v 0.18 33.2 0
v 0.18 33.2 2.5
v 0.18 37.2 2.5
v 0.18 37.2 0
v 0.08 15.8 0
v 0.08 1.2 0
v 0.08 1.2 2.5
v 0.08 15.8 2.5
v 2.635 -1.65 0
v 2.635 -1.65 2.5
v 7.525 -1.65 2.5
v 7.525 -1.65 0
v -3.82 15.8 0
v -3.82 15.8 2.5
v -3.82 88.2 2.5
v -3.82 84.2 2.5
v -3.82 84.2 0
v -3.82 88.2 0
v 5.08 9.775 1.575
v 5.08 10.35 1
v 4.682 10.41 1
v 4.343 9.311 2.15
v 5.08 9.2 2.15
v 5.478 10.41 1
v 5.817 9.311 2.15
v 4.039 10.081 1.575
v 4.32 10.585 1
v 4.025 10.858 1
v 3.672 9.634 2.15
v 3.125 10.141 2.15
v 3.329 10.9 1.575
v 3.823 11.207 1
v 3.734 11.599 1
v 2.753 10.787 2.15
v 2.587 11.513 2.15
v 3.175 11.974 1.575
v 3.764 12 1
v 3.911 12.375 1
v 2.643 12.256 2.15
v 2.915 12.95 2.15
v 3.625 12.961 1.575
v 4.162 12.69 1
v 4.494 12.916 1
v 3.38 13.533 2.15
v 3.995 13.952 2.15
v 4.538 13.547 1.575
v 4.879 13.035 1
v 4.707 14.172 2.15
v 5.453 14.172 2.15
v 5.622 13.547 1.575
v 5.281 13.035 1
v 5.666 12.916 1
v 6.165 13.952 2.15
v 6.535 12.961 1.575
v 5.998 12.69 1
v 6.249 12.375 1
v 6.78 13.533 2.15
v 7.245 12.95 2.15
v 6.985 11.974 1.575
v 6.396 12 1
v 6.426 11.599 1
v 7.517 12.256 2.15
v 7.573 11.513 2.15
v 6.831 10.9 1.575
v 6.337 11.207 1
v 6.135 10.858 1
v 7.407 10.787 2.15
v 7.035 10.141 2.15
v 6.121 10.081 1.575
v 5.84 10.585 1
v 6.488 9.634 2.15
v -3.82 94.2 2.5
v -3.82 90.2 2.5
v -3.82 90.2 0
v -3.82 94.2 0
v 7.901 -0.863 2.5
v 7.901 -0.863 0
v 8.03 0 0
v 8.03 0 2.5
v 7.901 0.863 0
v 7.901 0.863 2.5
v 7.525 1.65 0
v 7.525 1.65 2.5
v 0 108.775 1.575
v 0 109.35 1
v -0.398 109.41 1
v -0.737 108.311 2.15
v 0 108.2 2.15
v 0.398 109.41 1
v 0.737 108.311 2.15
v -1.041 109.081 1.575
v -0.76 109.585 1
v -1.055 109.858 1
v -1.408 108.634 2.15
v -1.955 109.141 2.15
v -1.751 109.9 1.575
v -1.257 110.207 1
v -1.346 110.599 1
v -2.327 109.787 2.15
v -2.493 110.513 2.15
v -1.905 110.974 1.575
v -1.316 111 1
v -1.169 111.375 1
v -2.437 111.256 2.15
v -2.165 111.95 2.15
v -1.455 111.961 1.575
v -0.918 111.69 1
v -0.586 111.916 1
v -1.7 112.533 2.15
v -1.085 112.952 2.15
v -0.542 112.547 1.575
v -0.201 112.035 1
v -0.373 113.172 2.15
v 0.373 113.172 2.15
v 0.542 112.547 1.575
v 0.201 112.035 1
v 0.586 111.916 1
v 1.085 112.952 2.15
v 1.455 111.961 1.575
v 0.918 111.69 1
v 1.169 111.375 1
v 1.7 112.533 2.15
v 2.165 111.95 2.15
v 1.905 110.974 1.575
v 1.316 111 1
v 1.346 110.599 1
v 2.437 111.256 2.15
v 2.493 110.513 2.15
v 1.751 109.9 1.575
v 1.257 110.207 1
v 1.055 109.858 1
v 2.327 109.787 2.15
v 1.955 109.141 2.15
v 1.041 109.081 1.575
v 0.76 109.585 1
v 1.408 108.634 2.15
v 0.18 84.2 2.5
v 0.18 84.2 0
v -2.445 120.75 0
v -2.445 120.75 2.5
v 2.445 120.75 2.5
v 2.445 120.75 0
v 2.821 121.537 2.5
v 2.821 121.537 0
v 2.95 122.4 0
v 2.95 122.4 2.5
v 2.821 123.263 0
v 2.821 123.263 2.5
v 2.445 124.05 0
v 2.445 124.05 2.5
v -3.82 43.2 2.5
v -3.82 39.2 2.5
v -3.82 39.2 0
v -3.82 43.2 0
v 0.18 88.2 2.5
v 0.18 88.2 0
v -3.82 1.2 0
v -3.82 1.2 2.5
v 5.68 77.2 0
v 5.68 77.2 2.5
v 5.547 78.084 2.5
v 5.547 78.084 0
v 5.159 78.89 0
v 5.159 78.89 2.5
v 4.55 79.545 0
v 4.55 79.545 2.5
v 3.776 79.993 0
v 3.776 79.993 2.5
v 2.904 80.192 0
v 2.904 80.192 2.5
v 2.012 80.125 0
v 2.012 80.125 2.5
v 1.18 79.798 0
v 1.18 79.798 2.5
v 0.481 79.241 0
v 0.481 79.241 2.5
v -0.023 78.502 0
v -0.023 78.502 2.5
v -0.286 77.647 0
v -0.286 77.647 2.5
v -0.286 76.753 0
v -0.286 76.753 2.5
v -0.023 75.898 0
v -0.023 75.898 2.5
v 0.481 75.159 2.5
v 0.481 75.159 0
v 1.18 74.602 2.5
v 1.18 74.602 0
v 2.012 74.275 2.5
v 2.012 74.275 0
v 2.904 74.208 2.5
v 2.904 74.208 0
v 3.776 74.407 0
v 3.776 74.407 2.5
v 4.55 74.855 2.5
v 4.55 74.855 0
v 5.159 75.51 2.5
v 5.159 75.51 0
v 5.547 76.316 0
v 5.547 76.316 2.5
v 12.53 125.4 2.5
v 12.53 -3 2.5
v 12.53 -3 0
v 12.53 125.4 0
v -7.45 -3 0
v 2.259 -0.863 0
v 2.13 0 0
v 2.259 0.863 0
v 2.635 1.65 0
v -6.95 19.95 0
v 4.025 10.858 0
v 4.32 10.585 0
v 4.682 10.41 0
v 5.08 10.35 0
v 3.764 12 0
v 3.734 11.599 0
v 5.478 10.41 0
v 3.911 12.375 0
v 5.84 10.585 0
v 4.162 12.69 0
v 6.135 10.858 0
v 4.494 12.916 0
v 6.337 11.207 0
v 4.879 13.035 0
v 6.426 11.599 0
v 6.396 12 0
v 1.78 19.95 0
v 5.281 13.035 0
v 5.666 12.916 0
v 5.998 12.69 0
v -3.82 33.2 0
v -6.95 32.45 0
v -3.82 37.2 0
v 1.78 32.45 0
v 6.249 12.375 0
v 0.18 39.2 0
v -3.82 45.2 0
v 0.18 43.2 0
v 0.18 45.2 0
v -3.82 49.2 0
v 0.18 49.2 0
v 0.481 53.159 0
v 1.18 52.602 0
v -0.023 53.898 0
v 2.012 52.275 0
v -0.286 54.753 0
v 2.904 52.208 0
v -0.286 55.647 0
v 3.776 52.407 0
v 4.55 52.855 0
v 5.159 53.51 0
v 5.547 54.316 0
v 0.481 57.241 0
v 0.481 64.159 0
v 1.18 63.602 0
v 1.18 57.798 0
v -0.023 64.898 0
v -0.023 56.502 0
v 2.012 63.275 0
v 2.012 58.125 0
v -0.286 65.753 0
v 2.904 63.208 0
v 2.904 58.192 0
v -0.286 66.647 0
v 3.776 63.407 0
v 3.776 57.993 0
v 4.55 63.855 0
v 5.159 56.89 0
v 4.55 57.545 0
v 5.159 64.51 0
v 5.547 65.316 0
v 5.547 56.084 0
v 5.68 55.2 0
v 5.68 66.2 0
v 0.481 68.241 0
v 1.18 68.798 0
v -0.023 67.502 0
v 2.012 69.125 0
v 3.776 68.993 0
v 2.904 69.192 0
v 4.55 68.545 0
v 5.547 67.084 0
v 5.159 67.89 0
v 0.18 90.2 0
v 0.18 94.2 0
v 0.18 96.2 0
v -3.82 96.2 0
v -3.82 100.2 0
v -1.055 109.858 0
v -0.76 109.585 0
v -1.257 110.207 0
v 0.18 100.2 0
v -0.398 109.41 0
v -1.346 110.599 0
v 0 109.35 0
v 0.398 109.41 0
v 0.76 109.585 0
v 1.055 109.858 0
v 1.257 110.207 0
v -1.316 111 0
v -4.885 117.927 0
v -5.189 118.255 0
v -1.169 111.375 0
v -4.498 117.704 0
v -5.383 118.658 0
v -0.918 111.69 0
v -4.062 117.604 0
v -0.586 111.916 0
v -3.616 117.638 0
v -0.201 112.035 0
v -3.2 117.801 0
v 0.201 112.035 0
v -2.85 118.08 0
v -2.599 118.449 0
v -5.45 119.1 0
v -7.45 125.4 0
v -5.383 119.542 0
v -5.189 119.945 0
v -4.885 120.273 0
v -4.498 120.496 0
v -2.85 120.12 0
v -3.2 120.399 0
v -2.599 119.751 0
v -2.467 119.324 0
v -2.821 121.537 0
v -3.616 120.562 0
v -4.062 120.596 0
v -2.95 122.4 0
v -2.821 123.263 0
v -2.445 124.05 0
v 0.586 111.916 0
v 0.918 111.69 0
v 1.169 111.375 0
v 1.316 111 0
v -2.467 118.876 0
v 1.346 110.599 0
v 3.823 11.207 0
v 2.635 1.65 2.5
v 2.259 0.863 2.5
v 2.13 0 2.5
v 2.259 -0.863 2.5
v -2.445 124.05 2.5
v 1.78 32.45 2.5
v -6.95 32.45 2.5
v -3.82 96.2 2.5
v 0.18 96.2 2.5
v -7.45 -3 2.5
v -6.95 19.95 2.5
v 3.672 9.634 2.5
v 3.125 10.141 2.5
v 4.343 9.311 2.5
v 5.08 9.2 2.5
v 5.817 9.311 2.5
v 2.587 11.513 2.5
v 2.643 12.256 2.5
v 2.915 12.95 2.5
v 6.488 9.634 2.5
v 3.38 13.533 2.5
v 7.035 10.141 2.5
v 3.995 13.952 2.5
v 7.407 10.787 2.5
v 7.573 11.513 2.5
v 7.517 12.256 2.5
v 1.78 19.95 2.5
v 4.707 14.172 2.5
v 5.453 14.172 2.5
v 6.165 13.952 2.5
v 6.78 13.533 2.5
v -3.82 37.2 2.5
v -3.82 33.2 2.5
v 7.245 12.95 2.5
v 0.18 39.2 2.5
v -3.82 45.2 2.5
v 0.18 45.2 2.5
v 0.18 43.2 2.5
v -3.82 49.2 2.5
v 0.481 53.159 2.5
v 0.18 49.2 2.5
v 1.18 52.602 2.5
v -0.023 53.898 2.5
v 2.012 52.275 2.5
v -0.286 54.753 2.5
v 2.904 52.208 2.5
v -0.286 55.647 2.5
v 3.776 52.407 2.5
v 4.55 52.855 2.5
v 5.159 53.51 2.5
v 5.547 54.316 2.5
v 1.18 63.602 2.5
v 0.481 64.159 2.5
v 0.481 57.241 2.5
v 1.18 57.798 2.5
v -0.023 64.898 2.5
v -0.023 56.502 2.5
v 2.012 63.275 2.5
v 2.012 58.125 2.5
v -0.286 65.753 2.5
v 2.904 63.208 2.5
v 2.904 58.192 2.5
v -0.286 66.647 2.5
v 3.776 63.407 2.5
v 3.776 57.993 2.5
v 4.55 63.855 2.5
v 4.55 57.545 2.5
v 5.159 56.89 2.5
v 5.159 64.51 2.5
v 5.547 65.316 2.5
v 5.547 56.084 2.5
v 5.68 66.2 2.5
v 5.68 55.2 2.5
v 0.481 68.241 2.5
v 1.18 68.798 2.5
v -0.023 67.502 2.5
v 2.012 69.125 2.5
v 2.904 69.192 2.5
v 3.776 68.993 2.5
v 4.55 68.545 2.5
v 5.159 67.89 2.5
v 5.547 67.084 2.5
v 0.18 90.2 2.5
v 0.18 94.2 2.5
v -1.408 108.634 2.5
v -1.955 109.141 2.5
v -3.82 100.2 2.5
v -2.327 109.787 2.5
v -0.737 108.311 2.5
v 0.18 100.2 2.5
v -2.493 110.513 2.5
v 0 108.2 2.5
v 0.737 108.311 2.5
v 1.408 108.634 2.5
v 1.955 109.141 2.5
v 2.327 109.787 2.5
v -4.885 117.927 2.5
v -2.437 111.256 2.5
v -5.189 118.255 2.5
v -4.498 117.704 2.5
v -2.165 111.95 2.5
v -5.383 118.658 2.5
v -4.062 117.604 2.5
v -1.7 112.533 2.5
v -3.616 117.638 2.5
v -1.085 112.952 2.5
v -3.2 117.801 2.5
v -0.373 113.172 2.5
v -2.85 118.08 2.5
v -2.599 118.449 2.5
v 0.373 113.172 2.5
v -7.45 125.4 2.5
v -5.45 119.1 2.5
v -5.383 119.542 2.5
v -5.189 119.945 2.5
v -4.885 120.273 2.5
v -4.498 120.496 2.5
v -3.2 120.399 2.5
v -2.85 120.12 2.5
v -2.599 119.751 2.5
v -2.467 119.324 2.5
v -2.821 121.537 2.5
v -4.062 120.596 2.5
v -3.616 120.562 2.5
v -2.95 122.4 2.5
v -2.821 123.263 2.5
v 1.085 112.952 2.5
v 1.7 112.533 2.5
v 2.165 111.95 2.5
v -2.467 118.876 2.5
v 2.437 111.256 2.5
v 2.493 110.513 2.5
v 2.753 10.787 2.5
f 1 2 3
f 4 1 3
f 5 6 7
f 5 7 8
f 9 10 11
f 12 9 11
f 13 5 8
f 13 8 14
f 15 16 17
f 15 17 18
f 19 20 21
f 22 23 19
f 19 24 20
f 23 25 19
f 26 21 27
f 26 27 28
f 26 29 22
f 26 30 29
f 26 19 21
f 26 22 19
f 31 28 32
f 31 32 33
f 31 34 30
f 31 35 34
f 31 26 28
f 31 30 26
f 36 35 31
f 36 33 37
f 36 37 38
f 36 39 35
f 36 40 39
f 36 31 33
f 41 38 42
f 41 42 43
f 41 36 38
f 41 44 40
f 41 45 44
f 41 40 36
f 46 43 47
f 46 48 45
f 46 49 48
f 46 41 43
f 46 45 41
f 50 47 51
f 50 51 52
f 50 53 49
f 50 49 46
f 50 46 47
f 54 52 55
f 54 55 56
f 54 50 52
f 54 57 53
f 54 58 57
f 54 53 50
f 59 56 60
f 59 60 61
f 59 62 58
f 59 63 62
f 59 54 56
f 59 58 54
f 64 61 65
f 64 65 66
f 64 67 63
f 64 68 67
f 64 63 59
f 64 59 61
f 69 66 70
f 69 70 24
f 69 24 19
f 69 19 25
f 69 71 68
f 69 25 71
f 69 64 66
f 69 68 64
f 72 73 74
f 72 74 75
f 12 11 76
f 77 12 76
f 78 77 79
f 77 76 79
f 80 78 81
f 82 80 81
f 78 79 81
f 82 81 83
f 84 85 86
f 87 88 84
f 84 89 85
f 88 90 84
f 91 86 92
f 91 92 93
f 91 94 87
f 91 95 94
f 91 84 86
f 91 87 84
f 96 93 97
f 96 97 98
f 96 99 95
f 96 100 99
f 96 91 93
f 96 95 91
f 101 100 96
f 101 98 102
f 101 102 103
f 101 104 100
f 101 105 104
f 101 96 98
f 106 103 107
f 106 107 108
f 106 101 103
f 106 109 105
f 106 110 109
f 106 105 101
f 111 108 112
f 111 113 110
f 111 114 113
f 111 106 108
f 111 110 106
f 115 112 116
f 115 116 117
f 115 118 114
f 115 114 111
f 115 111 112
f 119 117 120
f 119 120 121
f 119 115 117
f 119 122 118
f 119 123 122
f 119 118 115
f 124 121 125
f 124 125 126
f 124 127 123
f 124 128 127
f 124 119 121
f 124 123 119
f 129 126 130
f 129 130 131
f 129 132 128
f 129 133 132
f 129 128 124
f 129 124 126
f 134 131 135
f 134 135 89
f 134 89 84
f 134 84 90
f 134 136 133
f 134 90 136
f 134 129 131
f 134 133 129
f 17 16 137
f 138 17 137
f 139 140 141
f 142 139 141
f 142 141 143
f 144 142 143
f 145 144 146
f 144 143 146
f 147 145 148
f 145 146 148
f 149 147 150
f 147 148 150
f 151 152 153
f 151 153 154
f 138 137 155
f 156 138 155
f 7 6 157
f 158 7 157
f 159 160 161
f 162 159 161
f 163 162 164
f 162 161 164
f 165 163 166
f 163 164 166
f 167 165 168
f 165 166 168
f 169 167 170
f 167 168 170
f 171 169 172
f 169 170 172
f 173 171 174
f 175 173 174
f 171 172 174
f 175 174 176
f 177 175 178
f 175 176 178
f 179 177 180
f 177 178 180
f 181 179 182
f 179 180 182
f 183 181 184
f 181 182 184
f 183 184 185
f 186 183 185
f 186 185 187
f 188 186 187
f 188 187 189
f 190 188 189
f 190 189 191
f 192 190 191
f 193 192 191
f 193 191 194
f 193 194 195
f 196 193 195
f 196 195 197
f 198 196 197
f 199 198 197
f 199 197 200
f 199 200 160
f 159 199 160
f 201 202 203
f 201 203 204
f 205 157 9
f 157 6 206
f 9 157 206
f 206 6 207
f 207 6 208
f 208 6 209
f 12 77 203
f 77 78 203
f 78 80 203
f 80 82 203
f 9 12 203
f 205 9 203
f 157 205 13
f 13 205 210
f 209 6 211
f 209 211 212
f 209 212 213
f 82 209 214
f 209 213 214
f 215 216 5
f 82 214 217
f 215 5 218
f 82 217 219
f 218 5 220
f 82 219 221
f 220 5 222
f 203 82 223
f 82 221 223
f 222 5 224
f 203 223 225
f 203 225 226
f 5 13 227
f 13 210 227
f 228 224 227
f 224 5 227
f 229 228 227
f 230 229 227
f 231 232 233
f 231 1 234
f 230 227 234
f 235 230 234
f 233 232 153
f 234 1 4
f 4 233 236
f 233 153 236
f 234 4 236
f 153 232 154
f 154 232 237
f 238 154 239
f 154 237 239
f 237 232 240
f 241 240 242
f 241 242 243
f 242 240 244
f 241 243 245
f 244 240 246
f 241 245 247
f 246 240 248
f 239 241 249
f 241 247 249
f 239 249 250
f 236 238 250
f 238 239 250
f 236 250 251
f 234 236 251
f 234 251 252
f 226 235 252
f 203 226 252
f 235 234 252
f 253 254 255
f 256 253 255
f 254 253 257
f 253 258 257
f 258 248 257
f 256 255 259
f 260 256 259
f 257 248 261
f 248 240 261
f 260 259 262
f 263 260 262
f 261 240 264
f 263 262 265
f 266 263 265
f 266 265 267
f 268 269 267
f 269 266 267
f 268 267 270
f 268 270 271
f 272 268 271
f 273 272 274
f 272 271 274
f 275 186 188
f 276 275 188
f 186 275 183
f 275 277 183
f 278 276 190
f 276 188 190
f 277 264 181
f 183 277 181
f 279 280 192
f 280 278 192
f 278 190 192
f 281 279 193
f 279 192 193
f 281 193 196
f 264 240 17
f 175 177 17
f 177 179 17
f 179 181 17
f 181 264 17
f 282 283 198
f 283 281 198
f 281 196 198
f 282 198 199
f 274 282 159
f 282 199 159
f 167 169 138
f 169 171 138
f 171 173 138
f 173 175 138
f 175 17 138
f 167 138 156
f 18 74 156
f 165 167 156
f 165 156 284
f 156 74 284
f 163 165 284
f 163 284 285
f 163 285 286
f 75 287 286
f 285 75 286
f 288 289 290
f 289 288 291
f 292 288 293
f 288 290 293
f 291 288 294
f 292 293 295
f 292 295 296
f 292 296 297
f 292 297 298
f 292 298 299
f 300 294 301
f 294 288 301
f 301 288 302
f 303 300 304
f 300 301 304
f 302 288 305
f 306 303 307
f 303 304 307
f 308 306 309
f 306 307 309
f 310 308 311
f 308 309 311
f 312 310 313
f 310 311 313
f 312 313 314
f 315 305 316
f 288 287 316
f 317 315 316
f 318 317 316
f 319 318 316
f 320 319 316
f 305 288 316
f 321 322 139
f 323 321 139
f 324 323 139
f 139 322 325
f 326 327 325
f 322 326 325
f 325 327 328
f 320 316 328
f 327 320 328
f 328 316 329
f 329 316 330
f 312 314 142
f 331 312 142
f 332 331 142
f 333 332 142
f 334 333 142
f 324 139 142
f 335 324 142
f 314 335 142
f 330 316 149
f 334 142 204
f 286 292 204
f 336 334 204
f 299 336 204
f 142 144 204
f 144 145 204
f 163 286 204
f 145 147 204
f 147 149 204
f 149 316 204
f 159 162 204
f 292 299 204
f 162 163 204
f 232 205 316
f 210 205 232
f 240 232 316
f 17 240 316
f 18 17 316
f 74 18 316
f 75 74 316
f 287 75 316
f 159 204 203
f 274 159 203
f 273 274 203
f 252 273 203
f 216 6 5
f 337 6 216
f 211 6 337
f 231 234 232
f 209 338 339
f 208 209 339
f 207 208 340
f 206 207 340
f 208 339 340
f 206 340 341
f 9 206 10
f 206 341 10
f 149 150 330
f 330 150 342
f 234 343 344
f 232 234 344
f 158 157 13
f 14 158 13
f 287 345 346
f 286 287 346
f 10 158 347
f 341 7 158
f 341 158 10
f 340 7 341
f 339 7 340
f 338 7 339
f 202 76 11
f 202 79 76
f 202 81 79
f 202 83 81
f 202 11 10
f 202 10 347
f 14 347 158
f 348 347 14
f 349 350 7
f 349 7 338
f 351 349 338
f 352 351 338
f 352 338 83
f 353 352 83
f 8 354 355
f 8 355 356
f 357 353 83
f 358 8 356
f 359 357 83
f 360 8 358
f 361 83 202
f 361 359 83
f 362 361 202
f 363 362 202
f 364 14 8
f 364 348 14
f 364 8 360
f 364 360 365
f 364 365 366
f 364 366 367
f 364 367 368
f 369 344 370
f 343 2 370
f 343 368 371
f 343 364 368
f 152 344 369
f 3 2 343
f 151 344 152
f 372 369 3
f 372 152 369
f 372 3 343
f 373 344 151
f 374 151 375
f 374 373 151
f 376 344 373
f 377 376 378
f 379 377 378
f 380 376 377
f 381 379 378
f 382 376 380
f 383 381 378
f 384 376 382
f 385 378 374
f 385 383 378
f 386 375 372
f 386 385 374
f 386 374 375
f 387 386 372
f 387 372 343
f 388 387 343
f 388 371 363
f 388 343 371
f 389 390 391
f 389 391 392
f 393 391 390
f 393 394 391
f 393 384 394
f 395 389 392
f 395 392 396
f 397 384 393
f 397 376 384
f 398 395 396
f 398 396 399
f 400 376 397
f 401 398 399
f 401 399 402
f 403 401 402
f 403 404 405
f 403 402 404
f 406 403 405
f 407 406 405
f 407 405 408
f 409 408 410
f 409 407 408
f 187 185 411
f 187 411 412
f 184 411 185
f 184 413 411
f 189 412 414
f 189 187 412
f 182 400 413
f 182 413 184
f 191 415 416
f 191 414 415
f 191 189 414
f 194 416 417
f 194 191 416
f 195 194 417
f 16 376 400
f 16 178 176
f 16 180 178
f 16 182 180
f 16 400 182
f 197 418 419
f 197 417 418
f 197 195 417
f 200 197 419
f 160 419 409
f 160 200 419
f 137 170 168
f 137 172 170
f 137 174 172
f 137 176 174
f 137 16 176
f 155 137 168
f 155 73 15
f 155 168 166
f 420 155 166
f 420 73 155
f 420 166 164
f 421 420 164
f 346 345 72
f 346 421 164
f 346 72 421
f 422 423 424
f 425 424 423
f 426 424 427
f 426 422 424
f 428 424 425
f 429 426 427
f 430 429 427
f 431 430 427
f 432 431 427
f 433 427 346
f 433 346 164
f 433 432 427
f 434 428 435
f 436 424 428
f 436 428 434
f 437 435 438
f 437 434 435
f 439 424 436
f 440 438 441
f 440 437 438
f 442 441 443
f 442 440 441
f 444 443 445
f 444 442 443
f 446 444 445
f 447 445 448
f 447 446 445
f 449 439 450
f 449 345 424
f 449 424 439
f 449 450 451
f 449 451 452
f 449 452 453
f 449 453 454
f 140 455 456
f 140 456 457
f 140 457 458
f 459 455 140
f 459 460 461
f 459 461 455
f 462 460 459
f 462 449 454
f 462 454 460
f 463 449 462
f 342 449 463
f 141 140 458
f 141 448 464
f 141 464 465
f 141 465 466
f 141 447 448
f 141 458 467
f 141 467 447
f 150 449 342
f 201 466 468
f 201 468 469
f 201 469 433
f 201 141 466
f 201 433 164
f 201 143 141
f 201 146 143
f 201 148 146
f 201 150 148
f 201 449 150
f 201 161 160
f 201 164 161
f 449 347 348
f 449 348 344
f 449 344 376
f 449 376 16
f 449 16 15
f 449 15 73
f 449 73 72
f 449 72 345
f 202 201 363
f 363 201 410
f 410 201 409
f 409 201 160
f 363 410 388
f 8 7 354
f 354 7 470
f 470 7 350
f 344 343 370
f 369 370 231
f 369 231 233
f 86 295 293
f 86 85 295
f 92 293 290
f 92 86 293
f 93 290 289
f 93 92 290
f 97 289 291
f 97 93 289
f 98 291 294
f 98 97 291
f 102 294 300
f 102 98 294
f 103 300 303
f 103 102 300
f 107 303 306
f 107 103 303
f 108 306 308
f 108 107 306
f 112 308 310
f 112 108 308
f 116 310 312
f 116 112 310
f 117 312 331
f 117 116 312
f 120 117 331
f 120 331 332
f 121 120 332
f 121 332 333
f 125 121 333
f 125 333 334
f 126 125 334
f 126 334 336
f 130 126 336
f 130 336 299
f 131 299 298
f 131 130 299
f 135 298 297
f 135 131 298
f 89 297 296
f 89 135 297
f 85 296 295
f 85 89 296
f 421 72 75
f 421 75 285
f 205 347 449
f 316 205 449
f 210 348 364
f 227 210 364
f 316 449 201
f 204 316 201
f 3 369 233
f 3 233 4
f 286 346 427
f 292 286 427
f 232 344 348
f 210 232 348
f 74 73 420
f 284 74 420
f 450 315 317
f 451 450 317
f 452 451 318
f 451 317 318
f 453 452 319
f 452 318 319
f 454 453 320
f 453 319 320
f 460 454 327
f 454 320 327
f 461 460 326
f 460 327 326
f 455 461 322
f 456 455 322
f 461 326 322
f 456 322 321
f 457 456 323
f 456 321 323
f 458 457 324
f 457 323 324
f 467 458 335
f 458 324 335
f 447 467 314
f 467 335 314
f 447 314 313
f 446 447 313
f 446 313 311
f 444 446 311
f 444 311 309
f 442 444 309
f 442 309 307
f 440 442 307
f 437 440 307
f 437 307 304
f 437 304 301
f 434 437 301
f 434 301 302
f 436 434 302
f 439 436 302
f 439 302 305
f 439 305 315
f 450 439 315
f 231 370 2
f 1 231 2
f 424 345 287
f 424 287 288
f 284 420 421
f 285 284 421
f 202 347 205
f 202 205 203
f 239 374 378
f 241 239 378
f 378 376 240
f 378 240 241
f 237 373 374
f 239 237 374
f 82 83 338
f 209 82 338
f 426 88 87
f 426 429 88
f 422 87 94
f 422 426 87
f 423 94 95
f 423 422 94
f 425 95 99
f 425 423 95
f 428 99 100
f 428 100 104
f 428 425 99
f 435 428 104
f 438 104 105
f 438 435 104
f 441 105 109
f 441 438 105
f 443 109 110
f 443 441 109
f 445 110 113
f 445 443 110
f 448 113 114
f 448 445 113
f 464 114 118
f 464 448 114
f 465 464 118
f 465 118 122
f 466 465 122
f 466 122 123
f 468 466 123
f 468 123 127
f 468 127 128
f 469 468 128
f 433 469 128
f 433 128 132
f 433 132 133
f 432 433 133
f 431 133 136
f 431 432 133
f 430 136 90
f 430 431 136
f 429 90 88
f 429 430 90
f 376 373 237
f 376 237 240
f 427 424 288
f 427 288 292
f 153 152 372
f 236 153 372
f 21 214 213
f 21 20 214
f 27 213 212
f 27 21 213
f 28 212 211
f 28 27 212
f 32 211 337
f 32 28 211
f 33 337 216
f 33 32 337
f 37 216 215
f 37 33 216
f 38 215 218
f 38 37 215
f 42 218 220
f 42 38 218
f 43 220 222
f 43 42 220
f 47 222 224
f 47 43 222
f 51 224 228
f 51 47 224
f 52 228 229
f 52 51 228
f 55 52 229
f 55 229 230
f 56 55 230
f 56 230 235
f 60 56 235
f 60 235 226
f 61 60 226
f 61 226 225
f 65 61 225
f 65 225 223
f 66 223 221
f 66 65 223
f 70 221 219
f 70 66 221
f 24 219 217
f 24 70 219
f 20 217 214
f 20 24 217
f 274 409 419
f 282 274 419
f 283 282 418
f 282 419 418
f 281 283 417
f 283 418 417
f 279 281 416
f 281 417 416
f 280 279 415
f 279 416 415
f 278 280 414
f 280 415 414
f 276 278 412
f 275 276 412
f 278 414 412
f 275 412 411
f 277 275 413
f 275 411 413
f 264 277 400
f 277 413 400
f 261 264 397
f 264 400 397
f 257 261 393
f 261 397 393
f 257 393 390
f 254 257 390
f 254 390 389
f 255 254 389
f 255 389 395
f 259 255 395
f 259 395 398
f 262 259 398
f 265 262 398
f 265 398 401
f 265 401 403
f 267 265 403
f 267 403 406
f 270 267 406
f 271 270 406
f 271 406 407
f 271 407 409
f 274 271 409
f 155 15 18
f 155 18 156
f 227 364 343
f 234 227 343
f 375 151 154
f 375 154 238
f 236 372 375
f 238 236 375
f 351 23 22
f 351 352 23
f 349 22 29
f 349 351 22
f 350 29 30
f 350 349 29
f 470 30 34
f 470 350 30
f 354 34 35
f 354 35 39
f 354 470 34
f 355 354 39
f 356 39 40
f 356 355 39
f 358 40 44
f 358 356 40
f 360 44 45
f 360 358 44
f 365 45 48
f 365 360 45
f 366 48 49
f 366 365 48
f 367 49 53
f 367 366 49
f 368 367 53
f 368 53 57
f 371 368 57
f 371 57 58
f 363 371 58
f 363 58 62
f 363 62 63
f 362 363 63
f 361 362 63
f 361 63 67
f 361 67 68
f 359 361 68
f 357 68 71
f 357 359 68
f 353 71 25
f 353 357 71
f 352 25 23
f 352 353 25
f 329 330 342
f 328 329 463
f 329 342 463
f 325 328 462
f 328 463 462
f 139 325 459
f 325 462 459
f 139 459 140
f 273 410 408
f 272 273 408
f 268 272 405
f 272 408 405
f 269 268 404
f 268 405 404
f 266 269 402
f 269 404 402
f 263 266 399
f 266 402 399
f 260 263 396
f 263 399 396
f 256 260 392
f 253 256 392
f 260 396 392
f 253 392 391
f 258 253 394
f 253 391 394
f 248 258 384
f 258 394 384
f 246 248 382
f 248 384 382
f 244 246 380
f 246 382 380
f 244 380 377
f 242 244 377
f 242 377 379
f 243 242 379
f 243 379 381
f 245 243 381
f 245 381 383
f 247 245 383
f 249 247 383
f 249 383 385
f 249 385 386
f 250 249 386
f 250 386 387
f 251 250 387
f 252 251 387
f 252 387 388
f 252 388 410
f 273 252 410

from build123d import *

# Parameters (mm, degrees)
SKETCH1_W                                      = 19.98
SKETCH1_H                                      = 128.4
BOSS_EXTRUDE1_DEPTH                            = 2.5
CUT_EXTRUDE1_DEPTH                             = 127.049239982
CUT_EXTRUDE2_DEPTH                             = 127.049239982
SKETCH4_W                                      = 3.9
SKETCH4_H                                      = 14.6
CUT_EXTRUDE3_DEPTH                             = 127.049239982
F_3_0_3_DIAMETER_HOLE1_D                       = 3
CSK_FOR_M2_5_FLAT_HEAD_MACHINE_SCREW1_AT_COUNT = 2
CSK_FOR_M2_5_FLAT_HEAD_MACHINE_SCREW1_AT_PITCH = 99.130249672
USB_DEPTH                                      = 127.049239982
SKETCH10_W                                     = 4
SKETCH10_H                                     = 4
MCXX_DEPTH                                     = 127.049239982
COPY_MMCX_1_COUNT                              = 3
COPY_MMCX_1_PITCH                              = 6
COPY_MMCX_2_COUNT                              = 2
COPY_MMCX_2_PITCH                              = 51
COPY_MMCX_2_COPY_1_SKETCH_W                    = 4
COPY_MMCX_2_COPY_1_SKETCH_H                    = 4
COPY_MMCX_2_COPY_1_DEPTH                       = 127.049239982
COPY_MMCX_2_COPY_2_SKETCH_W                    = 4
COPY_MMCX_2_COPY_2_SKETCH_H                    = 4
COPY_MMCX_2_COPY_2_DEPTH                       = 127.049239982
SKETCH12_R                                     = 3
SELECTOR_1_DEPTH                               = 127.049239982
LPATTERN3_COUNT                                = 3
LPATTERN3_PITCH                                = 11


with BuildPart() as part:
    # Sketch1 → Boss-Extrude1 (new body)
    with BuildSketch(Plane.XY.offset(2.5)):
        with Locations((2.54, 61.2)):
            Rectangle(SKETCH1_W, SKETCH1_H)
    extrude(amount=-BOSS_EXTRUDE1_DEPTH)

    # Sketch2 → Cut-Extrude1 (cut, through all)
    with BuildSketch(Plane.XY.offset(2.5)):
        with BuildLine():
            Line((2.445403852, 124.05), (-2.445403852, 124.05))
            ThreePointArc((-2.445403852, 124.05), (-2.95, 122.4), (-2.445403852, 120.75))
            Line((-2.445403852, 120.75), (2.445403852, 120.75))
            ThreePointArc((2.445403852, 120.75), (2.95, 122.4), (2.445403852, 124.05))
        make_face()
    extrude(amount=-CUT_EXTRUDE1_DEPTH, mode=Mode.SUBTRACT)

    # Sketch3 → Cut-Extrude2 (cut, through all)
    with BuildSketch(Plane.XY.offset(2.5)):
        with BuildLine():
            Line((7.525403852, 1.65), (2.634596148, 1.65))
            ThreePointArc((2.634596148, 1.65), (2.13, 0), (2.634596148, -1.65))
            Line((2.634596148, -1.65), (7.525403852, -1.65))
            ThreePointArc((7.525403852, -1.65), (8.03, 0), (7.525403852, 1.65))
        make_face()
    extrude(amount=-CUT_EXTRUDE2_DEPTH, mode=Mode.SUBTRACT)

    # Sketch4 → Cut-Extrude3 (cut, through all)
    with BuildSketch(Plane(origin=(0, 0, 0), x_dir=(-1, 0, 0), z_dir=(0, 0, -1))):
        with Locations((1.87, 8.5)):
            Rectangle(SKETCH4_W, SKETCH4_H)
    extrude(amount=-CUT_EXTRUDE3_DEPTH, mode=Mode.SUBTRACT)

    # Ø3.0 (3) Diameter Hole1 (through all)
    with Locations(Plane.XY.offset(2.5)):
        with Locations((-3.95, 119.1)):
            Hole(F_3_0_3_DIAMETER_HOLE1_D / 2)

    # Sketch7 → CSK for M2.5 Flat Head Machine Screw1 (revolve, cut)
    with BuildSketch(Plane(origin=(5.08, 11.7, 2.5), x_dir=(0, -1, 0), z_dir=(1, 0, 0))):
        Polygon((0, 0), (0, 2.5), (1.35, 2.5), (1.35, 1.5), (2.5, 0.35), (2.5, 0), align=None)
    csk_for_m2_5_flat_head_machine_screw1 = revolve(axis=Axis((5.08, 11.7, 8.85), (0, 0, -1)), mode=Mode.SUBTRACT)

    # CSK for M2.5 Flat Head Machine Screw1 at: CSK for M2.5 Flat Head Machine Screw1 ×2
    with Locations(*[Vector(-0.05124570972853528, 0.9986860754183062, 0) * (i * CSK_FOR_M2_5_FLAT_HEAD_MACHINE_SCREW1_AT_PITCH) for i in range(1, CSK_FOR_M2_5_FLAT_HEAD_MACHINE_SCREW1_AT_COUNT)]):
        add(csk_for_m2_5_flat_head_machine_screw1, mode=Mode.SUBTRACT)

    # Sketch9 → USB (cut, through all)
    with BuildSketch(Plane.XY.offset(2.5)):
        Polygon((-3.82, 19.95), (1.78, 19.95), (1.78, 32.45), (-3.82, 32.45), (-6.95, 32.45), (-6.95, 19.95), align=None)
    extrude(amount=-USB_DEPTH, mode=Mode.SUBTRACT)

    # Sketch10 → MCXX (cut, through all)
    with BuildSketch(Plane.XY.offset(2.5)):
        with Locations((-1.82, 35.2)):
            Rectangle(SKETCH10_W, SKETCH10_H)
    mcxx = extrude(amount=-MCXX_DEPTH, mode=Mode.SUBTRACT)

    # Copy MMCX 1: MCXX ×3
    with Locations(*[(0, i * COPY_MMCX_1_PITCH, 0) for i in range(1, COPY_MMCX_1_COUNT)]):
        add(mcxx, mode=Mode.SUBTRACT)

    # Copy MMCX 2: MCXX ×2
    with Locations(*[(0, i * COPY_MMCX_2_PITCH, 0) for i in range(1, COPY_MMCX_2_COUNT)]):
        add(mcxx, mode=Mode.SUBTRACT)

    # Copy MMCX 2 copy 1 sketch → Copy MMCX 2 copy 1 (cut, through all)
    with BuildSketch(Plane(origin=(0, 57, 2.5), x_dir=(1, 0, 0), z_dir=(0, 0, 1))):
        with Locations((-1.82, 35.2)):
            Rectangle(COPY_MMCX_2_COPY_1_SKETCH_W, COPY_MMCX_2_COPY_1_SKETCH_H)
    extrude(amount=-COPY_MMCX_2_COPY_1_DEPTH, mode=Mode.SUBTRACT)

    # Copy MMCX 2 copy 2 sketch → Copy MMCX 2 copy 2 (cut, through all)
    with BuildSketch(Plane(origin=(0, 63, 2.5), x_dir=(1, 0, 0), z_dir=(0, 0, 1))):
        with Locations((-1.82, 35.2)):
            Rectangle(COPY_MMCX_2_COPY_2_SKETCH_W, COPY_MMCX_2_COPY_2_SKETCH_H)
    extrude(amount=-COPY_MMCX_2_COPY_2_DEPTH, mode=Mode.SUBTRACT)

    # Sketch12 → Selector 1 (cut, through all)
    with BuildSketch(Plane.XY.offset(2.5)):
        with Locations((2.68, 55.2)):
            Circle(SKETCH12_R)
    selector_1 = extrude(amount=-SELECTOR_1_DEPTH, mode=Mode.SUBTRACT)

    # LPattern3: Selector 1 ×3
    with Locations(*[(0, i * LPATTERN3_PITCH, 0) for i in range(1, LPATTERN3_COUNT)]):
        add(selector_1, mode=Mode.SUBTRACT)


solid = part.part
